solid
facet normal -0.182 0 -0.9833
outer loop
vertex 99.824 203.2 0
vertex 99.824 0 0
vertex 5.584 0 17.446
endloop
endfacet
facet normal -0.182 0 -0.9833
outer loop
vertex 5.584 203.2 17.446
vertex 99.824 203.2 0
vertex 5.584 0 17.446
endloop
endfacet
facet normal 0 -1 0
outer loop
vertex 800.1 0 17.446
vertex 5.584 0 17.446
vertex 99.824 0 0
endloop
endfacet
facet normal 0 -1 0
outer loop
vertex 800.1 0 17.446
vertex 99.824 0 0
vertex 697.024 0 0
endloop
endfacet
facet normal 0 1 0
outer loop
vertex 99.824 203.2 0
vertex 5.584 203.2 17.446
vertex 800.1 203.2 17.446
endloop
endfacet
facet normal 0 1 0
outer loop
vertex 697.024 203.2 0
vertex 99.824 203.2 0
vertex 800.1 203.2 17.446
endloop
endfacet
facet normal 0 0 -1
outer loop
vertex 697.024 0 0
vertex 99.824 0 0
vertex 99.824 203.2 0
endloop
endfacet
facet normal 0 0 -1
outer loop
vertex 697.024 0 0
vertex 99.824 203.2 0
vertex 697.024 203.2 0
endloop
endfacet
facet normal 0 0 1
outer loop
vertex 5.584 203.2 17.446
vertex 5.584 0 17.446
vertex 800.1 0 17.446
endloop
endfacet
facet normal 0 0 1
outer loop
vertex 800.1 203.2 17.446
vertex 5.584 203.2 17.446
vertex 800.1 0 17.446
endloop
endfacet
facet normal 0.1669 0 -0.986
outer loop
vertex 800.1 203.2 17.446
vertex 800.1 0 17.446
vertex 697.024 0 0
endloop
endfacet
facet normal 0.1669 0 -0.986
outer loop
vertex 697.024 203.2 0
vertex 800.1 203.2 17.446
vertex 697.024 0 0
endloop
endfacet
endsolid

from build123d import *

# Parameters (mm, degrees)
F0_W     = 800.1
F0_H     = 17.446322
F1_DEPTH = 203.2
F3_DEPTH = 203.2
F5_DEPTH = 203.2


with BuildPart() as f1:
    # F0 (on Front) → F1 (new body)
    with BuildSketch(Plane.XZ):
        with Locations((400.05, 8.723161)):
            Rectangle(F0_W, F0_H)
    extrude(amount=-F1_DEPTH)

    # F2 (on Front) → F3 (cut)
    with BuildSketch(Plane.XZ):
        Polygon((0, 18.480113), (0, 0), (99.82422, 0), align=None)
    extrude(amount=-F3_DEPTH, mode=Mode.SUBTRACT)

    # F4 (on face) → F5 (cut)
    with BuildSketch(Plane.XZ):
        Polygon((800.1, 17.446322), (697.02363, 0), (800.1, 0), align=None)
    extrude(amount=-F5_DEPTH, mode=Mode.SUBTRACT)


solid = f1.part
